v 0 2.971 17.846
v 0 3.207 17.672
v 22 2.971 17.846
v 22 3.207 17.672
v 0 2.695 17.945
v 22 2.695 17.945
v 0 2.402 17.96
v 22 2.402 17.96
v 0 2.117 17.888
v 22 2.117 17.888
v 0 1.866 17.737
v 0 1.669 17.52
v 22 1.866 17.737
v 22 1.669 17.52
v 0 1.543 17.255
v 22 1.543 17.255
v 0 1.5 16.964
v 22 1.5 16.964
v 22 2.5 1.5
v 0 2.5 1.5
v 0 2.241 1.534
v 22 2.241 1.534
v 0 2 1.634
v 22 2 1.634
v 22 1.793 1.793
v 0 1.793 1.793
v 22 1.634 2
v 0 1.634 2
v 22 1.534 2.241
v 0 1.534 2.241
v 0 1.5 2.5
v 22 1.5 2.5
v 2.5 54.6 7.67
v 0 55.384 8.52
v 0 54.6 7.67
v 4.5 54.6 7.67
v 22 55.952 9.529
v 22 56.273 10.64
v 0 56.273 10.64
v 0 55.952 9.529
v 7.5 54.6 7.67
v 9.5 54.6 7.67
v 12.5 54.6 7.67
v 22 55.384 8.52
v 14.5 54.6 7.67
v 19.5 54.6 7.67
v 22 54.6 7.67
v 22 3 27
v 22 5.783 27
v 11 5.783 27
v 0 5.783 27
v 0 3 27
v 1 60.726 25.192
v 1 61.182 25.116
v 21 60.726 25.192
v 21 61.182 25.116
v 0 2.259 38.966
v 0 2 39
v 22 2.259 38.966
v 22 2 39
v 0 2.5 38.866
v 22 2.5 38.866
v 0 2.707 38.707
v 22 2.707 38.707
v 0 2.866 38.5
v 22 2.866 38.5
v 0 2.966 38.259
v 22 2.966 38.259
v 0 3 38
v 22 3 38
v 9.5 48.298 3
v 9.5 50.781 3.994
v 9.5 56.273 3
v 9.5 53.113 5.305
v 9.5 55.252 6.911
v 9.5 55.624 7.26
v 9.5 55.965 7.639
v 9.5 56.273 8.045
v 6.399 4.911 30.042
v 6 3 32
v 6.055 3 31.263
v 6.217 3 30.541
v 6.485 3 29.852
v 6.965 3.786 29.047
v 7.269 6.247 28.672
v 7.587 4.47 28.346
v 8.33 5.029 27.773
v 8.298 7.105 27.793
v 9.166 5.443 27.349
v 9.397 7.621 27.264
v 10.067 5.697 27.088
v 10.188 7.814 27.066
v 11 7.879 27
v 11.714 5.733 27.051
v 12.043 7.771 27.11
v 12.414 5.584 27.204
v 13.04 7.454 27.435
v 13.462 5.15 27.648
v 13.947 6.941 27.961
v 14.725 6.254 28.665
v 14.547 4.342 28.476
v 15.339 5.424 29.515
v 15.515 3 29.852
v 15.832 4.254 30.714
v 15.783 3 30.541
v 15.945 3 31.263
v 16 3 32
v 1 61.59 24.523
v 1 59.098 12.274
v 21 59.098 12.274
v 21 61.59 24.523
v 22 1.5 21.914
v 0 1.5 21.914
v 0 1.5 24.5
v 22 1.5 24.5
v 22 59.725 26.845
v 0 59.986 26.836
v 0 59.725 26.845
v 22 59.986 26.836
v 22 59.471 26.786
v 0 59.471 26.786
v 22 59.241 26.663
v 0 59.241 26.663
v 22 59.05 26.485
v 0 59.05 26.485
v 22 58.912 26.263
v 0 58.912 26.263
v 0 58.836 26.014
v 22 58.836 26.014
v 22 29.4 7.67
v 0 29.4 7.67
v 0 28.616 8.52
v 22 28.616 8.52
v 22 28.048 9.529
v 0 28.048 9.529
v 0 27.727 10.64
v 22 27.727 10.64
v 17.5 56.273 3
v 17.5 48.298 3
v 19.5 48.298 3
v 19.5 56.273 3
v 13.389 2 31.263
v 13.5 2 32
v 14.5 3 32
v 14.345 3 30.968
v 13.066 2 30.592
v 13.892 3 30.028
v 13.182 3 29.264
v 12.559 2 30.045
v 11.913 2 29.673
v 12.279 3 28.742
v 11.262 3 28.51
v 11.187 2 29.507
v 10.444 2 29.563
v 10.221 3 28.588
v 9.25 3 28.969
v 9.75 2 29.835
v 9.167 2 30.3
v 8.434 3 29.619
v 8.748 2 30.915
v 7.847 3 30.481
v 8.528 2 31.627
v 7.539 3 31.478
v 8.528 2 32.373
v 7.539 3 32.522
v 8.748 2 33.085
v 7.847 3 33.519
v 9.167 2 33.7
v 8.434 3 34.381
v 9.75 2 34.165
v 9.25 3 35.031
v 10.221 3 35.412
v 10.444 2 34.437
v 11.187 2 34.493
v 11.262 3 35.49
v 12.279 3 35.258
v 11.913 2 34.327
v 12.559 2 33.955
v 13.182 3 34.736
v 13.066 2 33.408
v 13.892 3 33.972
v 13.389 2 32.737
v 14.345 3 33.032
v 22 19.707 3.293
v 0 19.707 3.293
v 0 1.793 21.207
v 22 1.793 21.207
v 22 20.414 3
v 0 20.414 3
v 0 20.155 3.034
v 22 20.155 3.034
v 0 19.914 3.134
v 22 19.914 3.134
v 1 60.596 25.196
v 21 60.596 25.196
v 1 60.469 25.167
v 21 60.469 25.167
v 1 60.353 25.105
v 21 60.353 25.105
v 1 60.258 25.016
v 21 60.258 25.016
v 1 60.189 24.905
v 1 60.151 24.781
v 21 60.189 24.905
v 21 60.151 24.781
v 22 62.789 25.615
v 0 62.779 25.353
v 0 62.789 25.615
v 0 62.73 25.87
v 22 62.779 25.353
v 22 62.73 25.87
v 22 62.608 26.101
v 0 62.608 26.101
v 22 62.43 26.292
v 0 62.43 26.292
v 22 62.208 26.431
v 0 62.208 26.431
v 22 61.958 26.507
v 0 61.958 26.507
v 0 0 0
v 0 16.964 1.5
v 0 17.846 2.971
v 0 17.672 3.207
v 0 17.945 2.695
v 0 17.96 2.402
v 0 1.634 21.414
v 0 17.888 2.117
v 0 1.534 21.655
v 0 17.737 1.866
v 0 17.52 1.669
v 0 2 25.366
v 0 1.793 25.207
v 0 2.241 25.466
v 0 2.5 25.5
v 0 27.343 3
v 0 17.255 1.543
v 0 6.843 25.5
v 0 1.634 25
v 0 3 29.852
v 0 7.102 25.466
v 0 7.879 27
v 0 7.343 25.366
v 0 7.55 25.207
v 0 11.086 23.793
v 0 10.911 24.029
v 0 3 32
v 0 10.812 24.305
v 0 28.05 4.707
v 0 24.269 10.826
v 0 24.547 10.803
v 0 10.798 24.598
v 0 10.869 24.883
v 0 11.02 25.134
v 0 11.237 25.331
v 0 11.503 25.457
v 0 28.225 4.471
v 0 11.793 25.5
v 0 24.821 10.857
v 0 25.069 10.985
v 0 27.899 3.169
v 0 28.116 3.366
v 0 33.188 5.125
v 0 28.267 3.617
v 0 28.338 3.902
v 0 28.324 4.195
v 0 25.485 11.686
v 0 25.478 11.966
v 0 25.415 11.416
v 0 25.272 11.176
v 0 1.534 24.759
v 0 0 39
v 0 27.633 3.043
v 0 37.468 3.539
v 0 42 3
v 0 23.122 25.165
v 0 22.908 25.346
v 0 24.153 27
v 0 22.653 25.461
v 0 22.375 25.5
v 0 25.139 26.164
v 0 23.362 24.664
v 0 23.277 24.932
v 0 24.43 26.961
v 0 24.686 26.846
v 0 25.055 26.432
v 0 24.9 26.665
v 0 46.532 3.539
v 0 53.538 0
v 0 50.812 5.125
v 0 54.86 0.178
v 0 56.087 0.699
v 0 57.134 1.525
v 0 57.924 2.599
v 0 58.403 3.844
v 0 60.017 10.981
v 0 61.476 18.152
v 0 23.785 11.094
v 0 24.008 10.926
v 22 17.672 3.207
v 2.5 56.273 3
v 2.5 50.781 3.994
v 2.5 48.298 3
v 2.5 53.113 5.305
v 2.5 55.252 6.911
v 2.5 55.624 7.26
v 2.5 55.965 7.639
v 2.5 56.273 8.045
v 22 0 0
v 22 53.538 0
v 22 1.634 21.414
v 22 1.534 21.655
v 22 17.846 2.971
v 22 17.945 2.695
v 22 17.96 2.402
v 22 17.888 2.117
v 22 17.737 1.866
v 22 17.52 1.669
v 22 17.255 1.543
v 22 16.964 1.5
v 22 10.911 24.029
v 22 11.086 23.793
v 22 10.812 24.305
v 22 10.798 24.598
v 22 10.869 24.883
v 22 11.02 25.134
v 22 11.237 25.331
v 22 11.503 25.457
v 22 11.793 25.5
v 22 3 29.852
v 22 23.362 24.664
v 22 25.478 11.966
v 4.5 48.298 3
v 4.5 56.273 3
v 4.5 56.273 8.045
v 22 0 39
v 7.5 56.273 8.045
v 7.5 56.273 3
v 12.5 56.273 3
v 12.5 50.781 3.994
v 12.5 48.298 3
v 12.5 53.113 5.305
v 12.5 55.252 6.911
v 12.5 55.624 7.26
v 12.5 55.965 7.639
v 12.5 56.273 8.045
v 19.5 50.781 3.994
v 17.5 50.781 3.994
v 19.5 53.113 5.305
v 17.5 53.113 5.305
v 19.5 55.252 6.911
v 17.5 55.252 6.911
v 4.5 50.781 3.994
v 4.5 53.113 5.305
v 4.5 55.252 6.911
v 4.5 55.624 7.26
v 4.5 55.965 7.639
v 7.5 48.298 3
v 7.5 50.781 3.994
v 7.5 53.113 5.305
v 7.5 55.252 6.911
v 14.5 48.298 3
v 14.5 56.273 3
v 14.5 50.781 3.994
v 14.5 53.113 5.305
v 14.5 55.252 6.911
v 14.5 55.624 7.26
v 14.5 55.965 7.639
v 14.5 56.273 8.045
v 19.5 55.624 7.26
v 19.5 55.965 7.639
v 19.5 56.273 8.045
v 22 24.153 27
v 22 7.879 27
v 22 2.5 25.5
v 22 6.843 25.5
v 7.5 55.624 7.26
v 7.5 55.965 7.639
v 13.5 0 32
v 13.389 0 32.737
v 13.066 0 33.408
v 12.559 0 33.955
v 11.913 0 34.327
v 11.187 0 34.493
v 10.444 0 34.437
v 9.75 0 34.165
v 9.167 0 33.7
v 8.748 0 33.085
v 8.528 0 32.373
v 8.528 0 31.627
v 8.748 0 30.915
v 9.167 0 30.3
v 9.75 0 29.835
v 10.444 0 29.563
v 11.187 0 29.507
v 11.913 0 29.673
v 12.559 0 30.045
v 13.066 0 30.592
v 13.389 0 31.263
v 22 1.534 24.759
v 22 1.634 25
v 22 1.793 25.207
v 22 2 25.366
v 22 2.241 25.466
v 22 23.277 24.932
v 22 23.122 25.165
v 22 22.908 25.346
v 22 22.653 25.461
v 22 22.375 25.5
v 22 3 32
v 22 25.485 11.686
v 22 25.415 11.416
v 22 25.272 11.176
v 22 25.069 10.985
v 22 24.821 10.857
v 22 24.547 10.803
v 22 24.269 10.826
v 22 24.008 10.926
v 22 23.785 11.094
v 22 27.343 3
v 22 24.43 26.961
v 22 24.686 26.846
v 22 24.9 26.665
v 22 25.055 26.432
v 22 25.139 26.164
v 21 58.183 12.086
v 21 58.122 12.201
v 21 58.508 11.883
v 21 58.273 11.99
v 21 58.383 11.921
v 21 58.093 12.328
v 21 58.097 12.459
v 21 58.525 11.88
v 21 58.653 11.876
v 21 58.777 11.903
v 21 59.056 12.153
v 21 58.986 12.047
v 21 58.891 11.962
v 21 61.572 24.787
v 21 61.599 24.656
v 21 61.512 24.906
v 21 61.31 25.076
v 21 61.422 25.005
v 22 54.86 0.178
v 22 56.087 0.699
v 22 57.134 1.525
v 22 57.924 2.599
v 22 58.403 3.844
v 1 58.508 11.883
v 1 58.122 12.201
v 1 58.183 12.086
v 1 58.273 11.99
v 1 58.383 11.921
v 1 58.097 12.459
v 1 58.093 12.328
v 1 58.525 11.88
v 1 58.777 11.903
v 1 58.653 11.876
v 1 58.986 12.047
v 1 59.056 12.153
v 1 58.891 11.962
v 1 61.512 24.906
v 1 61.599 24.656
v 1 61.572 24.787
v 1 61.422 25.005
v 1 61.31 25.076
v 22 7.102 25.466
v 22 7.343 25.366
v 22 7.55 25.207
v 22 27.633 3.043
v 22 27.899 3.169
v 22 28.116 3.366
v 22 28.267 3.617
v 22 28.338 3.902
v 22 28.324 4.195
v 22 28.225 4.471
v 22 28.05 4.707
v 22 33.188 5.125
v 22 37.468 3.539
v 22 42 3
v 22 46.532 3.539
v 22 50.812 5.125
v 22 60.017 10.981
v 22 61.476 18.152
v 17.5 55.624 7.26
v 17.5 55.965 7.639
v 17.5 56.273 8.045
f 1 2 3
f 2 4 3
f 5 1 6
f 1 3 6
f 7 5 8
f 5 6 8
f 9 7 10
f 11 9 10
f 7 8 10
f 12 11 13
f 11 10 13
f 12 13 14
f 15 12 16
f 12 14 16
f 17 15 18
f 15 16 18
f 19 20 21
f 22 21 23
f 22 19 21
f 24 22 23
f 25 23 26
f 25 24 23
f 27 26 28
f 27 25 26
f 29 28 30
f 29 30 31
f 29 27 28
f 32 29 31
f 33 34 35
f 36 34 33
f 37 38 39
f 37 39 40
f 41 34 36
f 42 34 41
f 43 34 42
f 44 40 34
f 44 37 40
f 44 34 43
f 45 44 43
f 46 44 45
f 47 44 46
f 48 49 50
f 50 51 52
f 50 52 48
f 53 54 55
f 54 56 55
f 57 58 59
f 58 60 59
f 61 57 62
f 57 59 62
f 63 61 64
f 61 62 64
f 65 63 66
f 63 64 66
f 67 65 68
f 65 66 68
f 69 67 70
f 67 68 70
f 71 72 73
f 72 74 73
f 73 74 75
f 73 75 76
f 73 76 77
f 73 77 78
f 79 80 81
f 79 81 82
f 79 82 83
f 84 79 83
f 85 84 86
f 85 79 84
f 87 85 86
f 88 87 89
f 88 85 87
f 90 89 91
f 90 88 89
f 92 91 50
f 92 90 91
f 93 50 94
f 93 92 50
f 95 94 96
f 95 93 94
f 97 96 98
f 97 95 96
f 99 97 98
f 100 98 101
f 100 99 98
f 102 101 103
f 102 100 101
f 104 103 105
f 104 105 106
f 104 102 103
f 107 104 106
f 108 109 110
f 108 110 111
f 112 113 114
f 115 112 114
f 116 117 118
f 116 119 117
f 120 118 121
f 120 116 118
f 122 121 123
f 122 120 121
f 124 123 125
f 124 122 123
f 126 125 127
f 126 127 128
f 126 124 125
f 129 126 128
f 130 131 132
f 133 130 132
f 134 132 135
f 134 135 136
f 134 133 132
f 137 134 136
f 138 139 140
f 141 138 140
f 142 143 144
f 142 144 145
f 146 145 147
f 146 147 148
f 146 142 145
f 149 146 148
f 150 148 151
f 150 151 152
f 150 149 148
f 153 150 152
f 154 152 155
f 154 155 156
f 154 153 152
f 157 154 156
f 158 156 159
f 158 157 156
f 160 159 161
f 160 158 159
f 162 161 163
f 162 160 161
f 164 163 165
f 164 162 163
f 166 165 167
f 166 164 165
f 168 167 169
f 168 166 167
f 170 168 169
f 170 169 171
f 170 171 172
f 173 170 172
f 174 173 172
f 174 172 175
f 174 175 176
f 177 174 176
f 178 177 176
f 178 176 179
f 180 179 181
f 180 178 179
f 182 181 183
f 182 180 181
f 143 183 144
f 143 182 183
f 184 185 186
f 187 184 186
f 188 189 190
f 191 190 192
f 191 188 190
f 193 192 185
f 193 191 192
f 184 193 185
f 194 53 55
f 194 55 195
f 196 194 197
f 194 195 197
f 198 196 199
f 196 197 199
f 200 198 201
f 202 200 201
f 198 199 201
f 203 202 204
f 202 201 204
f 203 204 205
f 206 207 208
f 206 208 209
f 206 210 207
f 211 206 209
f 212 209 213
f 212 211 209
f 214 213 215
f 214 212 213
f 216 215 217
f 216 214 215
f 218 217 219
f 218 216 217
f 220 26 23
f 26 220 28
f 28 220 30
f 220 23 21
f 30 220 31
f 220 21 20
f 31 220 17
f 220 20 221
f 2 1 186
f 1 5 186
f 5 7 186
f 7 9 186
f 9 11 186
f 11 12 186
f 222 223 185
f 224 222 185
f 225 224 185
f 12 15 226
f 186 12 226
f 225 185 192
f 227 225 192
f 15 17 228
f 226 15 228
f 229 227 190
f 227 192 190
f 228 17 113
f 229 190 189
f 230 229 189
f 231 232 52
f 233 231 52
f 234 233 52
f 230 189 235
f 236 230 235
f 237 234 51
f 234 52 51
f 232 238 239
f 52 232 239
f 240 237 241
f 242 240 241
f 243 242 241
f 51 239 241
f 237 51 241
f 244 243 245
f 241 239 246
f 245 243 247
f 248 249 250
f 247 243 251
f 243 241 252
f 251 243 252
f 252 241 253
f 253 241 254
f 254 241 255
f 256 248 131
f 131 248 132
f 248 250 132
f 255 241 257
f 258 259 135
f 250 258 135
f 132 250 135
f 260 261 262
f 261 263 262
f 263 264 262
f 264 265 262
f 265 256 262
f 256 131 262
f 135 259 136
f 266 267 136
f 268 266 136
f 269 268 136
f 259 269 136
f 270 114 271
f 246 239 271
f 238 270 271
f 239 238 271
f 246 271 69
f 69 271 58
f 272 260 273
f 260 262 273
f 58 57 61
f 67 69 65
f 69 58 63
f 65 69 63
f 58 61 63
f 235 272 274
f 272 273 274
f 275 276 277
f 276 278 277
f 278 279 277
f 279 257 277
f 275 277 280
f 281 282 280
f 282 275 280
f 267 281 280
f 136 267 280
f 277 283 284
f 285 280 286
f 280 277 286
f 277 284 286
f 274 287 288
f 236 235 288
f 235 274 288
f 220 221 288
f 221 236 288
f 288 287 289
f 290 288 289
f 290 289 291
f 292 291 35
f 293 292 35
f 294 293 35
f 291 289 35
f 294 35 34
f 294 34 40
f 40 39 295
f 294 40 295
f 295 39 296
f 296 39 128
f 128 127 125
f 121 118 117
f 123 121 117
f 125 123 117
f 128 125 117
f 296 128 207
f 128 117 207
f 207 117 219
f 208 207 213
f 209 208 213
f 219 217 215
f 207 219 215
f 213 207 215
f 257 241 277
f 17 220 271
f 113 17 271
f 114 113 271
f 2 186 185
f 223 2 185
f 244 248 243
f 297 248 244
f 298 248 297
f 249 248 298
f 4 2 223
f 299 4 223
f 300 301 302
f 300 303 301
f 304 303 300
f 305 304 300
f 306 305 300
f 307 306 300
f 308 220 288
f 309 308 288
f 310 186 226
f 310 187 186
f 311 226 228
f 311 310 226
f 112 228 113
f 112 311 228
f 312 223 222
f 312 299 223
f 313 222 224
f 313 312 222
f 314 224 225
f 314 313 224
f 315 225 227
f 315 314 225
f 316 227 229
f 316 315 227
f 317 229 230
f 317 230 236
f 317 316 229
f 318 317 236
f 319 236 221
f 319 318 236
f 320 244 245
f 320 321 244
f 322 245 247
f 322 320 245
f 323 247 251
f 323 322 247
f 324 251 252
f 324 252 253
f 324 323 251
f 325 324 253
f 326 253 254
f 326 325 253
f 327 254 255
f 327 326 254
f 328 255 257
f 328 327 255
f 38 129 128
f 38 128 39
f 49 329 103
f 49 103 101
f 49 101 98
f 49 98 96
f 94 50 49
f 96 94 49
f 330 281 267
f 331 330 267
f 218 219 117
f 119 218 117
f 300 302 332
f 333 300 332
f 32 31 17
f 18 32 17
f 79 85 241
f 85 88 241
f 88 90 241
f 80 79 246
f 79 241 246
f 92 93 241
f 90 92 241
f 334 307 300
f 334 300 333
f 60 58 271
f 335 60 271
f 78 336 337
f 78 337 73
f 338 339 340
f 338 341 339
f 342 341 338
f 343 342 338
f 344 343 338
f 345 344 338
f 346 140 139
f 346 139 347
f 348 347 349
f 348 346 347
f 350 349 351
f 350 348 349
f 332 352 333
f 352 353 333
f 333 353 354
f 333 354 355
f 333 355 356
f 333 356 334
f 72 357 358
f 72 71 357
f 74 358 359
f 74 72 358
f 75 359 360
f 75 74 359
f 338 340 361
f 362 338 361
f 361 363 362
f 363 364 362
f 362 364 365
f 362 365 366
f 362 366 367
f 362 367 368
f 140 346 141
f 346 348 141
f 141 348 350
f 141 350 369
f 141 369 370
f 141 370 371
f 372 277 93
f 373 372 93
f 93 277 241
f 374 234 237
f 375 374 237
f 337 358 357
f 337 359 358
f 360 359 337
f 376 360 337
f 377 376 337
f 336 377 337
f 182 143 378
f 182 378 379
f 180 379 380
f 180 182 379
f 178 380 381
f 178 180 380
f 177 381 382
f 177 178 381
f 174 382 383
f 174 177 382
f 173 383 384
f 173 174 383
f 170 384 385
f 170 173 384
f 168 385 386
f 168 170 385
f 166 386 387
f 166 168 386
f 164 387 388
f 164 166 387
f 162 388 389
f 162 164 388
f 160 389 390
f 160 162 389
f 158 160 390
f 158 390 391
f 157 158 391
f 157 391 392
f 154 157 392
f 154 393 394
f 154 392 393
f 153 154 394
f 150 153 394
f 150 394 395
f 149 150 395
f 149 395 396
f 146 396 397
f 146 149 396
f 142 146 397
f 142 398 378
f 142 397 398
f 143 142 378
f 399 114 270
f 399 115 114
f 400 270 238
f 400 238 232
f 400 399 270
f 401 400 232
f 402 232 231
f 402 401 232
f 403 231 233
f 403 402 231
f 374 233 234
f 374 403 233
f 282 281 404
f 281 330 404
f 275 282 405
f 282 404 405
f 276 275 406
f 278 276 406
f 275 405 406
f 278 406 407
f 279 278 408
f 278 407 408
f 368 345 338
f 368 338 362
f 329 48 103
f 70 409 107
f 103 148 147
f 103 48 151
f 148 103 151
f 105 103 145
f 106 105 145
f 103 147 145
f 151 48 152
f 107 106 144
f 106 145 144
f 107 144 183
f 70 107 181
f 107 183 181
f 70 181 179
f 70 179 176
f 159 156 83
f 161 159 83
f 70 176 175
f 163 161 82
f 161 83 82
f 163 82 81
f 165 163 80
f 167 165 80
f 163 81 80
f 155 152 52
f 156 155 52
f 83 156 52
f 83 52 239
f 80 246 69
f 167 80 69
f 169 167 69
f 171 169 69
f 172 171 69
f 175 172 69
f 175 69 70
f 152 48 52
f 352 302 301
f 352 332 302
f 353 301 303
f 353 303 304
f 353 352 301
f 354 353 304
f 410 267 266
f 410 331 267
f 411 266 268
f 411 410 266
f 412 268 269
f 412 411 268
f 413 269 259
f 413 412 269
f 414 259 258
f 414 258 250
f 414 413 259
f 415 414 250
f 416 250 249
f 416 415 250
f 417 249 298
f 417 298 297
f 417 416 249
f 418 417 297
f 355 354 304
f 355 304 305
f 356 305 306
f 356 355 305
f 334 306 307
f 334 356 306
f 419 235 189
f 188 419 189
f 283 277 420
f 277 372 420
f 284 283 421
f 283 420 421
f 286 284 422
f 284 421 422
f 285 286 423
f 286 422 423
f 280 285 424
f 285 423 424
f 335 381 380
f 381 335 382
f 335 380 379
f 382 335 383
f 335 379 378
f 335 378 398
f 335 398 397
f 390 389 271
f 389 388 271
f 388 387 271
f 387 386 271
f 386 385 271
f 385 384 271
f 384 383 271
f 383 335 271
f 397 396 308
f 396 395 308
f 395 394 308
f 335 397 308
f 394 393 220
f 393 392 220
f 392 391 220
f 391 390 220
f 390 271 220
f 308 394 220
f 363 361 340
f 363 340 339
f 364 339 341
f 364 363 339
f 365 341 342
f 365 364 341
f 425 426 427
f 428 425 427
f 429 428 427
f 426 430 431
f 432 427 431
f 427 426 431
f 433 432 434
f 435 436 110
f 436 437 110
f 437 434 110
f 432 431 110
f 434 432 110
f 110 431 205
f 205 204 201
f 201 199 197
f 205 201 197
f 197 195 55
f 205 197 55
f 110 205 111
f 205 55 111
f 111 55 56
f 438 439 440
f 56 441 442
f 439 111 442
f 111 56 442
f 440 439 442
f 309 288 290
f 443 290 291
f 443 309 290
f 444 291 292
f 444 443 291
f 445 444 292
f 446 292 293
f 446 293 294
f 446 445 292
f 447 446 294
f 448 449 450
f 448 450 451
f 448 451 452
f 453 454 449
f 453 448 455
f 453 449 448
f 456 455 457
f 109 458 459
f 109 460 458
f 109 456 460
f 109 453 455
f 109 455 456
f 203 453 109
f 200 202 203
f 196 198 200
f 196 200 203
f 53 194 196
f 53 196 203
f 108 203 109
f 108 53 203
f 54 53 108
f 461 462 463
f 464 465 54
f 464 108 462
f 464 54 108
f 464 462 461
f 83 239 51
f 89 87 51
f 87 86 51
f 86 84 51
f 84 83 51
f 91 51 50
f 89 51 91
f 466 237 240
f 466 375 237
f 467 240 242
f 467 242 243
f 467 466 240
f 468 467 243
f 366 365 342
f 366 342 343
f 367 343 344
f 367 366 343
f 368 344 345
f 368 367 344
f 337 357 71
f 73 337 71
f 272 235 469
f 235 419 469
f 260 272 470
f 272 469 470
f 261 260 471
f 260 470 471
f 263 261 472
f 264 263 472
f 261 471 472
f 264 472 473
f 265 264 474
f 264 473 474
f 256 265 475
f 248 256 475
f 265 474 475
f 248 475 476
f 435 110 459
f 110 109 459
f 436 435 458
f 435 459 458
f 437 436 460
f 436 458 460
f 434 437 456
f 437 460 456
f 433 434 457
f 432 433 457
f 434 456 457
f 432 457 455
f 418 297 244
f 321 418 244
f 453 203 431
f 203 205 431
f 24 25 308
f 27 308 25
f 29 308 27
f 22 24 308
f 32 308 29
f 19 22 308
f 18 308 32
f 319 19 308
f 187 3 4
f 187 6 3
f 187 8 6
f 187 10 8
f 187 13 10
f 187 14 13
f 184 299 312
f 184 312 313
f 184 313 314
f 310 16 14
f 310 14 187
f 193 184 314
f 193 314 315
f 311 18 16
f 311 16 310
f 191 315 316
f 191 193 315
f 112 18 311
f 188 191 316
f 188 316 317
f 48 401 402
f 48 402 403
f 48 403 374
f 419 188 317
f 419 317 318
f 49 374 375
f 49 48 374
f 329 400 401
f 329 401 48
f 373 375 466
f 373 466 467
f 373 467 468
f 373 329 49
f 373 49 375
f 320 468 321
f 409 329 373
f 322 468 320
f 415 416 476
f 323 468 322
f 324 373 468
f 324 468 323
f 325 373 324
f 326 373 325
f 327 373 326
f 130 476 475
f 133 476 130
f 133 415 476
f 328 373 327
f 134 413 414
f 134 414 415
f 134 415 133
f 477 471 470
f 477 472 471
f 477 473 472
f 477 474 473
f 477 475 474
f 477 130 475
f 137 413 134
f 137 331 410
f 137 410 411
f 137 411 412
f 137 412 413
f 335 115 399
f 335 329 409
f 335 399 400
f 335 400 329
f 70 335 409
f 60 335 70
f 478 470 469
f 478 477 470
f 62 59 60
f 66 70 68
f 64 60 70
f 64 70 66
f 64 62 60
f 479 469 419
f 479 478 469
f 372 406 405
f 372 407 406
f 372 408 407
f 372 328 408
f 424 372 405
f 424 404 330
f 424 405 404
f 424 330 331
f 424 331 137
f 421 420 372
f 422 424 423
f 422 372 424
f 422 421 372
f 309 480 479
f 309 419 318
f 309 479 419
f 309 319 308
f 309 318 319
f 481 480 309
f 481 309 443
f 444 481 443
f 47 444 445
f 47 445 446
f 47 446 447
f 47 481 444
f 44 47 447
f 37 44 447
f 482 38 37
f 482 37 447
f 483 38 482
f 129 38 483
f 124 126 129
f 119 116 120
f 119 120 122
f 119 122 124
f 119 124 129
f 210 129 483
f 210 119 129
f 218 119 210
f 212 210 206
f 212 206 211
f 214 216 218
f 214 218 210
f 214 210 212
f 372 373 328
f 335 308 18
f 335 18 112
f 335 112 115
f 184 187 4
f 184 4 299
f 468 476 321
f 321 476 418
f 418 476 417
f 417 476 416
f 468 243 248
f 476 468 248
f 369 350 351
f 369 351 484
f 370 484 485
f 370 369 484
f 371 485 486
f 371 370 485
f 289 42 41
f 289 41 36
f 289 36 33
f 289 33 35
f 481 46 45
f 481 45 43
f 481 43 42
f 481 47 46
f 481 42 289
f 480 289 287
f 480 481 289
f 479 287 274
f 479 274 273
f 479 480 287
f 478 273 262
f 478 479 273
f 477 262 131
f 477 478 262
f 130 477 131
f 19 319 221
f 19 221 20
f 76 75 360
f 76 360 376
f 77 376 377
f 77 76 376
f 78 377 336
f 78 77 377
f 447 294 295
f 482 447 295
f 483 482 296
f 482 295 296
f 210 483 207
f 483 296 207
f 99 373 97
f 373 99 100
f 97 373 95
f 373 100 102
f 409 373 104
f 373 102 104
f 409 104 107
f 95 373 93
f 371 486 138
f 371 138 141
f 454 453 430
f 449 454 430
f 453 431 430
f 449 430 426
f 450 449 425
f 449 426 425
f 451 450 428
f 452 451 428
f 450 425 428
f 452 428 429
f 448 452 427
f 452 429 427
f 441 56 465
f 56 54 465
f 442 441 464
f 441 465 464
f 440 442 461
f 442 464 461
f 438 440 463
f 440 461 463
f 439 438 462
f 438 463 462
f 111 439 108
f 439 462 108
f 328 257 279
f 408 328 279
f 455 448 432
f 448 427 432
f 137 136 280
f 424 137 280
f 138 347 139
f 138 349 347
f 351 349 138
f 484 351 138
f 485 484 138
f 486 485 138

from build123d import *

# Parameters (mm, degrees)
F1_DEPTH  = 22
F2_R      = 5
F3_R      = 1
F4_R      = 1
F6_R      = 5
F7_DEPTH  = 47
F8_R      = 2.5
F9_DEPTH  = 50.001
F10_SIZE  = 1
F12_W     = 2
F12_H     = 14.2733568645
F13_DEPTH = 47
F16_DEPTH = 10
F17_R     = 0.5
F19_DEPTH = 22


with BuildPart() as f1:
    # F0 (on Right) → F1 (new body)
    with BuildSketch(Plane.YZ):
        with BuildLine():
            Line((3, 32), (3, 39))
            Line((3, 39), (0, 39))
            Line((0, 39), (0, 0))
            Line((0, 0), (57.4654344921, 0))
            ThreePointArc((57.4654344921, 0), (60.4687056177, 13.1164471126), (62.9455756953, 26.3424040508))
            Line((62.9455756953, 26.3424040508), (59, 27))
            Line((59, 27), (56, 9))
            ThreePointArc((56, 9), (42, 3), (28, 9))
            Line((28, 9), (25, 27))
            Line((25, 27), (7.8786796564, 27))
            Line((7.8786796564, 27), (5.7829372183, 27))
            Line((5.7829372183, 27), (3, 27))
            Line((3, 27), (3, 29.8521417825))
            Line((3, 29.8521417825), (3, 32))
        make_face()
        Polygon((19.3786796564, 1.5), (1.5, 1.5), (1.5, 19.3786796564), align=None, mode=Mode.SUBTRACT)
        Polygon((20, 3), (1.5, 21.5), (1.5, 25.5), (7.2573593129, 25.5), (29.7573593129, 3), align=None, mode=Mode.SUBTRACT)
        Polygon((25.9911590566, 8.8875205998), (9.3786796564, 25.5), (23.2224124899, 25.5), align=None, mode=Mode.SUBTRACT)
        Polygon((7.8786796564, 27), (3, 32), (3, 29.8521417825), (5.7829372183, 27), align=None)
    extrude(amount=F1_DEPTH)

    # F2
    f2_edges = [f1.edges().sort_by_distance(p)[0] for p in [
        (11, 57.465434, 0),
        (11, 56, 9),
        (11, 28, 9),
    ]]
    fillet(f2_edges, radius=F2_R)

    # F3
    f3_edges = [f1.edges().sort_by_distance(p)[0] for p in [
        (11, 59, 27),
        (11, 62.945576, 26.342404),
        (11, 3, 39),
        (11, 25, 27),
        (11, 23.222412, 25.5),
    ]]
    fillet(f3_edges, radius=F3_R)

    # F4
    f4_edges = [f1.edges().sort_by_distance(p)[0] for p in [
        (11, 1.5, 1.5),
        (11, 19.37868, 1.5),
        (11, 20, 3),
        (11, 1.5, 21.5),
        (11, 1.5, 19.37868),
        (11, 7.257359, 25.5),
        (11, 9.37868, 25.5),
        (11, 29.757359, 3),
        (11, 1.5, 25.5),
        (11, 25.991159, 8.887521),
    ]]
    fillet(f4_edges, radius=F4_R)

    # F6 (on offset) → F7 (cut, through all)
    with BuildSketch(Plane.XZ.offset(-50)):
        with Locations((11, 32)):
            Circle(F6_R)
    extrude(amount=F7_DEPTH, mode=Mode.SUBTRACT)

    # F8 (on offset) → F9 (cut, through all)
    with BuildSketch(Plane.XZ.offset(-50)):
        with Locations((11, 32)):
            Circle(F8_R)
    extrude(amount=F9_DEPTH, mode=Mode.SUBTRACT)

    # F10
    f10_edges = [f1.edges().sort_by_distance(p)[0] for p in [
        (8.5, 3, 32),
    ]]
    chamfer(f10_edges, length=F10_SIZE)

    # F12 (on offset) → F13 (cut)
    with BuildSketch(Plane.XY.offset(50)):
        with Locations((3.5, 49.1366784322)):
            Rectangle(F12_W, F12_H)
        with Locations((8.5, 49.1366784322)):
            Rectangle(F12_W, F12_H)
        with Locations((13.5, 49.1366784322)):
            Rectangle(F12_W, F12_H)
        with Locations((18.5, 49.1366784322)):
            Rectangle(F12_W, F12_H)
    extrude(amount=-F13_DEPTH, mode=Mode.SUBTRACT)

    # F15 (on offset) → F16 (cut, symmetric)
    with BuildSketch(Plane.YZ.offset(11)):
        Polygon((61.6930370138, 25.0304698651), (60.2329924048, 25.2738106333), (58.0149187036, 11.9653684263), (59.0013126275, 11.800969439), align=None)
    extrude(amount=F16_DEPTH, both=True, mode=Mode.SUBTRACT)

    # F17
    f17_edges = [f1.edges().sort_by_distance(p)[0] for p in [
        (11, 59.001313, 11.800969),
        (11, 60.232992, 25.273811),
        (11, 61.693037, 25.03047),
        (11, 58.014919, 11.965368),
    ]]
    fillet(f17_edges, radius=F17_R)

    # F18 (on face) → F19 (join, through all)
    with BuildSketch(Plane.YZ.offset(22)):
        with BuildLine():
            ThreePointArc((54.600010703, 7.6698580269), (42, 3), (29.399989297, 7.6698580269))
            Line((29.399989297, 7.6698580269), (28.7482646674, 6.9114024796))
            ThreePointArc((28.7482646674, 6.9114024796), (42, 2.000000095), (55.2517353326, 6.9114024796))
            ThreePointArc((55.2517353326, 6.9114024796), (56.568912669, 8.5171443059), (57.2597506946, 10.4757422152))
            Line((57.2597506946, 10.4757422152), (56.2733568645, 10.6401411869))
            ThreePointArc((56.2733568645, 10.6401411869), (55.6976585007, 9.0079762366), (54.600010703, 7.6698580269))
        make_face()
    extrude(amount=-F19_DEPTH)


solid = f1.part
